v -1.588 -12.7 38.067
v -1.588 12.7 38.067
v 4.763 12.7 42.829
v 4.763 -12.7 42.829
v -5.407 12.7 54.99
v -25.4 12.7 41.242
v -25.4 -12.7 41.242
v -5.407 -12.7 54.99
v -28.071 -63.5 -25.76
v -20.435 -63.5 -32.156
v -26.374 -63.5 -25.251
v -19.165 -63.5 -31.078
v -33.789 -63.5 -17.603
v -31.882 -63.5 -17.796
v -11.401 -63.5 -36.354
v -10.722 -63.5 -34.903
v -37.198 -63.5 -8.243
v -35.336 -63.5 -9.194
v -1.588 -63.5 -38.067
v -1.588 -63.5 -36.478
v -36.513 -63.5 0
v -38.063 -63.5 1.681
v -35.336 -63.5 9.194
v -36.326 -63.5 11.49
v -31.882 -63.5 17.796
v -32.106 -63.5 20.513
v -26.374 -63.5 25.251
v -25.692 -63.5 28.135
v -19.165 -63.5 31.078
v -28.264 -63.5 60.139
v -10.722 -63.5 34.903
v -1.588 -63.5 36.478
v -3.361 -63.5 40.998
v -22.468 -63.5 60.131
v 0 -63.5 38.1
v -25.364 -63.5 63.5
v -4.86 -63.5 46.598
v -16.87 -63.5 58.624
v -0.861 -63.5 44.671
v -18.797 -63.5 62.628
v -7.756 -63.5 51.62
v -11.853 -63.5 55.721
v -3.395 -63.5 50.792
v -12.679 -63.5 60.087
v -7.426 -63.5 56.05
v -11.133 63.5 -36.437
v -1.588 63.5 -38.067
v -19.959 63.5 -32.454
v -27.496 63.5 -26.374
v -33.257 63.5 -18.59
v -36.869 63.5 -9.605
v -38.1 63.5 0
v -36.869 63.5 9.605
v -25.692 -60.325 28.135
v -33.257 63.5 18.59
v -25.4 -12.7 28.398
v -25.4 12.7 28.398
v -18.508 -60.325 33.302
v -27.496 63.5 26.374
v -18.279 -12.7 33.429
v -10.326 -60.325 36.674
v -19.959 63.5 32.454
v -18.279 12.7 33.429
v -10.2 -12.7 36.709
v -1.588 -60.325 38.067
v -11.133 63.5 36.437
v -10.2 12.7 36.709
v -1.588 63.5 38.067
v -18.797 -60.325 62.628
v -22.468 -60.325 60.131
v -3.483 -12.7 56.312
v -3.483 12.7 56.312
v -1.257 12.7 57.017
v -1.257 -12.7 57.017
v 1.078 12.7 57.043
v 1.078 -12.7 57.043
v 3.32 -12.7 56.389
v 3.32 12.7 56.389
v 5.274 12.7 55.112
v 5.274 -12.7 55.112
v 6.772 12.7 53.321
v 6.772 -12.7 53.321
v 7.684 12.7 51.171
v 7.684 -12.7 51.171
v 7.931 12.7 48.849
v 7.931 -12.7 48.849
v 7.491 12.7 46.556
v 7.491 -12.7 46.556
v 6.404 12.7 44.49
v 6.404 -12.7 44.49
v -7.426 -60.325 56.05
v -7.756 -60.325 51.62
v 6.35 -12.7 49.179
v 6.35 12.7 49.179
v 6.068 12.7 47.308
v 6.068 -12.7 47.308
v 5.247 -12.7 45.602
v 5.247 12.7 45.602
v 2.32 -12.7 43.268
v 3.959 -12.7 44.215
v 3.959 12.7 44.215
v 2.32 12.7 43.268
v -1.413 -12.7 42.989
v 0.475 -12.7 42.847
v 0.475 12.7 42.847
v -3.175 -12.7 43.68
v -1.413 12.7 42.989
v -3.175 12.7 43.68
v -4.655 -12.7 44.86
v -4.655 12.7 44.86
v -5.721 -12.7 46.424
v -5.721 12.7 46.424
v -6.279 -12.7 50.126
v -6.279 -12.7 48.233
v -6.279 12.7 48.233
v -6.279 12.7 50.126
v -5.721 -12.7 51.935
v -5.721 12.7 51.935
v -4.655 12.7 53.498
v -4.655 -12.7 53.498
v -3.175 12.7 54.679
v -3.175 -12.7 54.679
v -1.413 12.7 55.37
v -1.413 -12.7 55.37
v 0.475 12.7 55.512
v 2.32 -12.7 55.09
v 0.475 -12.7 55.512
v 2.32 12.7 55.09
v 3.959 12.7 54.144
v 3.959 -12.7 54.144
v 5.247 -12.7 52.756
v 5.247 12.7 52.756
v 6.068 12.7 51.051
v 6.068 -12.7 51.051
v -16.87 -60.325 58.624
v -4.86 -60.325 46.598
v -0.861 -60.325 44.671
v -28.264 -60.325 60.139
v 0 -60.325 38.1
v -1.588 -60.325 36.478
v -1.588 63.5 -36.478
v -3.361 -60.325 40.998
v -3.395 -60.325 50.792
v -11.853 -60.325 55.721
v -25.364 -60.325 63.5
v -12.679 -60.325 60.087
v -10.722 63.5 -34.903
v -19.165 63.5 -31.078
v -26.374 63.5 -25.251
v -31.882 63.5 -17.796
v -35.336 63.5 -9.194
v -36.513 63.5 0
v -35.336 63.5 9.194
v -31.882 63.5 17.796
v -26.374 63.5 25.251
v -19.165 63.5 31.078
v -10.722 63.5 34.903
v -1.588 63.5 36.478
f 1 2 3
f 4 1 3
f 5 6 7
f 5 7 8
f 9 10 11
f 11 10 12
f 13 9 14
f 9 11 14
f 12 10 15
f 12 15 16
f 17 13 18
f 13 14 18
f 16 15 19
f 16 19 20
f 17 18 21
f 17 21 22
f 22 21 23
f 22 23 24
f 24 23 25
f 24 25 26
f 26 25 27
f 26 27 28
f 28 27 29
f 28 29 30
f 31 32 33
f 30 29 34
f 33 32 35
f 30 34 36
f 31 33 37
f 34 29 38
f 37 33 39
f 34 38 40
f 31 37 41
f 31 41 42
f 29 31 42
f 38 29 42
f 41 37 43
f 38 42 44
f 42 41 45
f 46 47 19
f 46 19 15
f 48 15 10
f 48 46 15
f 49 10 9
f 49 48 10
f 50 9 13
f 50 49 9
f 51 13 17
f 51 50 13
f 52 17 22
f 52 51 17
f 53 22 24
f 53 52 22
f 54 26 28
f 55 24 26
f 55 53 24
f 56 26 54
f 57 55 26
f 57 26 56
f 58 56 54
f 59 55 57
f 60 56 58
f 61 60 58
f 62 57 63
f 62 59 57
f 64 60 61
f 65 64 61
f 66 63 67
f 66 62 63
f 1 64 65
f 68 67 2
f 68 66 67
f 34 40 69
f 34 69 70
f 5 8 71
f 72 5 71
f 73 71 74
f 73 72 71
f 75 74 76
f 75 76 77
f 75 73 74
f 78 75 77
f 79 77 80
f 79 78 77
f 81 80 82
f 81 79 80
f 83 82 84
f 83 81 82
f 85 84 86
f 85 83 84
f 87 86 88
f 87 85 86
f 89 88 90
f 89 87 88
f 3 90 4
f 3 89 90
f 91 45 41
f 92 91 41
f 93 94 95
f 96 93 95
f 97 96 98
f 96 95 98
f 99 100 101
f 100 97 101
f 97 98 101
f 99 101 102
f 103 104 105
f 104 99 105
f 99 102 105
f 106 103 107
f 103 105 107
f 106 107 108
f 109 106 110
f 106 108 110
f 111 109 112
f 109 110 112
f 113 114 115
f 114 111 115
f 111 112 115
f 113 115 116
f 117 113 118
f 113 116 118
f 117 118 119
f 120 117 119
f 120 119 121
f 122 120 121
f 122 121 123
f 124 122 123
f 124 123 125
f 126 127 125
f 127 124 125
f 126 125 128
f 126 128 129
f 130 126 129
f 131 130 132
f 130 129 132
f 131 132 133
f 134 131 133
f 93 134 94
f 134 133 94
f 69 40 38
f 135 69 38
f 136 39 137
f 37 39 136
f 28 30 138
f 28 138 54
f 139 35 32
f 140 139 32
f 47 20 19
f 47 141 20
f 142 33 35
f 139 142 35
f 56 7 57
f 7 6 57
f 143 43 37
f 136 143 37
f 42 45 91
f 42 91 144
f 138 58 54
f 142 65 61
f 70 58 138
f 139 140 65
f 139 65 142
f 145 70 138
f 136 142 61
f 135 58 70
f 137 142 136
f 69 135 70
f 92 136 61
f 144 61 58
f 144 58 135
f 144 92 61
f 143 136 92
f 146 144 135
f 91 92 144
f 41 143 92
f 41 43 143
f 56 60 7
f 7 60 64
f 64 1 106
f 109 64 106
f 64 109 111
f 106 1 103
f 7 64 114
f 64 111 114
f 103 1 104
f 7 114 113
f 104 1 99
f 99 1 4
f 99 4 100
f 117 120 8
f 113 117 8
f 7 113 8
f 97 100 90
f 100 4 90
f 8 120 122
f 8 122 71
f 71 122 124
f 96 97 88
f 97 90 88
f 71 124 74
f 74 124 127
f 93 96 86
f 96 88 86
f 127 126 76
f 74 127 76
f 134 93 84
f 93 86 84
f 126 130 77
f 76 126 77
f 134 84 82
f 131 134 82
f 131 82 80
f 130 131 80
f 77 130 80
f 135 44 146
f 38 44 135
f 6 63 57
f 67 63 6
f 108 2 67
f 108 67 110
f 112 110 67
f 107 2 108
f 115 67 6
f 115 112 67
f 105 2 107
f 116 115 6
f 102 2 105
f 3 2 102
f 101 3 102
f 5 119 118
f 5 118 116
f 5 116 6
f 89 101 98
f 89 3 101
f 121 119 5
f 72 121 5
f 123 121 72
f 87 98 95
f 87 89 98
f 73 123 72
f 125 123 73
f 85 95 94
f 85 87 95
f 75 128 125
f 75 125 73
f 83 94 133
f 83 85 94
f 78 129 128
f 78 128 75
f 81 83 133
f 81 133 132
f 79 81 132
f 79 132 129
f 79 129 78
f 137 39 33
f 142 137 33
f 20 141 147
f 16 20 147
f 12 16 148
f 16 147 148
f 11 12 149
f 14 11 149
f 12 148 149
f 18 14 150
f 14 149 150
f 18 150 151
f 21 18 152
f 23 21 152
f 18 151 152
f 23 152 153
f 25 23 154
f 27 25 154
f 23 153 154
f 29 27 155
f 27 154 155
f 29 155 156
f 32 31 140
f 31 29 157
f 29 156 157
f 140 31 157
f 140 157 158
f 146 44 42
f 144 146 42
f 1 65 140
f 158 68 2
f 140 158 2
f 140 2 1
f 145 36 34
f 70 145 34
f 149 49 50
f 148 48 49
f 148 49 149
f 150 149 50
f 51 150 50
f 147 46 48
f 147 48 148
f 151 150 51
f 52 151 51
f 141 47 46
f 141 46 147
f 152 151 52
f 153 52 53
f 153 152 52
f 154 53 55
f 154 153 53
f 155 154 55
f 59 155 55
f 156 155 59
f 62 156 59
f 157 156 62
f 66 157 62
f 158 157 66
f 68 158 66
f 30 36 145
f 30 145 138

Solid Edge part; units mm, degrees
sketch "Sketch1" plane through (0, 0, 0) normal (0, -1, 0) x (1, 0, 0)
  line L0 (-1.5875, -36.478) -> (-1.5875, -38.0669)
  arc A0 (-1.5875, -38.0669) -> (-1.5875, 38.0669) centre (0, 0) cw
  line L1 (-1.5875, 38.0669) -> (-1.5875, 36.478)
  arc A1 (-1.5875, -36.478) -> (-1.5875, 36.478) centre (0, 0) cw
extrude "Protrusion1" add sketch "Sketch1" along normal mid plane 127
sketch "Sketch2" plane through (0, 0, 0) normal (0, -1, 0) x (1, 0, 0)
  circle A0 centre (0, 49.1794) radius 6.35
  line L0 (-25.4, 41.2419) -> (-5.4073, 54.9902)
  line L1 (-1.5875, 38.0669) -> (4.7625, 42.8294)
  line L2 (-25.4, 41.2419) -> (-25.4, 28.3981)
  arc A1 (-5.4073, 54.9902) -> (4.7625, 42.8294) centre (0, 49.1794) cw
  arc A2 (-1.5875, 38.0669) -> (-25.4, 28.3981) centre (0, 0) ccw
extrude "ExtrudedProtrusion_2" add sketch "Sketch2" along normal mid plane 25.4
sketch "Sketch3" plane through (-19.8437, -63.5, 0) normal (0, -1, 0) x (0, 0, -1)
  line L0 (-40.9984, 16.4824) -> (-38.1, 19.8437)
  line L1 (-44.6712, 18.9824) -> (-40.9984, 16.4824)
  line L2 (-44.6712, 18.9824) -> (-46.598, 14.9833)
  line L3 (-50.7924, 16.4486) -> (-46.598, 14.9833)
  line L4 (-50.7924, 16.4486) -> (-51.6195, 12.0873)
  line L5 (-56.0501, 12.418) -> (-51.6195, 12.0873)
  line L6 (-56.0501, 12.418) -> (-55.7213, 7.9911)
  line L7 (-60.0868, 7.165) -> (-55.7213, 7.9911)
  line L8 (-60.0868, 7.165) -> (-58.6244, 2.9737)
  line L9 (-62.6277, 1.0467) -> (-58.6244, 2.9737)
  line L10 (-62.6277, 1.0467) -> (-60.1312, -2.6239)
  line L11 (-63.5, -5.5205) -> (-60.1312, -2.6239)
  line L12 (-63.5, -5.5205) -> (-60.1392, -8.4207)
  line L13 (-60.1392, -8.4207) -> (-28.1345, -5.8479)
  line L14 (-36.478, 18.2562) -> (-38.0669, 18.2562)
  line L15 (-38.1, 19.8437) -> (-36.478, 18.2562)
  arc A0 (-38.0669, 18.2563) -> (-28.1345, -5.8479) centre (0, 19.8437) ccw
extrude "ExtrudedProtrusion_3" add sketch "Sketch3" against normal blind 3.175
